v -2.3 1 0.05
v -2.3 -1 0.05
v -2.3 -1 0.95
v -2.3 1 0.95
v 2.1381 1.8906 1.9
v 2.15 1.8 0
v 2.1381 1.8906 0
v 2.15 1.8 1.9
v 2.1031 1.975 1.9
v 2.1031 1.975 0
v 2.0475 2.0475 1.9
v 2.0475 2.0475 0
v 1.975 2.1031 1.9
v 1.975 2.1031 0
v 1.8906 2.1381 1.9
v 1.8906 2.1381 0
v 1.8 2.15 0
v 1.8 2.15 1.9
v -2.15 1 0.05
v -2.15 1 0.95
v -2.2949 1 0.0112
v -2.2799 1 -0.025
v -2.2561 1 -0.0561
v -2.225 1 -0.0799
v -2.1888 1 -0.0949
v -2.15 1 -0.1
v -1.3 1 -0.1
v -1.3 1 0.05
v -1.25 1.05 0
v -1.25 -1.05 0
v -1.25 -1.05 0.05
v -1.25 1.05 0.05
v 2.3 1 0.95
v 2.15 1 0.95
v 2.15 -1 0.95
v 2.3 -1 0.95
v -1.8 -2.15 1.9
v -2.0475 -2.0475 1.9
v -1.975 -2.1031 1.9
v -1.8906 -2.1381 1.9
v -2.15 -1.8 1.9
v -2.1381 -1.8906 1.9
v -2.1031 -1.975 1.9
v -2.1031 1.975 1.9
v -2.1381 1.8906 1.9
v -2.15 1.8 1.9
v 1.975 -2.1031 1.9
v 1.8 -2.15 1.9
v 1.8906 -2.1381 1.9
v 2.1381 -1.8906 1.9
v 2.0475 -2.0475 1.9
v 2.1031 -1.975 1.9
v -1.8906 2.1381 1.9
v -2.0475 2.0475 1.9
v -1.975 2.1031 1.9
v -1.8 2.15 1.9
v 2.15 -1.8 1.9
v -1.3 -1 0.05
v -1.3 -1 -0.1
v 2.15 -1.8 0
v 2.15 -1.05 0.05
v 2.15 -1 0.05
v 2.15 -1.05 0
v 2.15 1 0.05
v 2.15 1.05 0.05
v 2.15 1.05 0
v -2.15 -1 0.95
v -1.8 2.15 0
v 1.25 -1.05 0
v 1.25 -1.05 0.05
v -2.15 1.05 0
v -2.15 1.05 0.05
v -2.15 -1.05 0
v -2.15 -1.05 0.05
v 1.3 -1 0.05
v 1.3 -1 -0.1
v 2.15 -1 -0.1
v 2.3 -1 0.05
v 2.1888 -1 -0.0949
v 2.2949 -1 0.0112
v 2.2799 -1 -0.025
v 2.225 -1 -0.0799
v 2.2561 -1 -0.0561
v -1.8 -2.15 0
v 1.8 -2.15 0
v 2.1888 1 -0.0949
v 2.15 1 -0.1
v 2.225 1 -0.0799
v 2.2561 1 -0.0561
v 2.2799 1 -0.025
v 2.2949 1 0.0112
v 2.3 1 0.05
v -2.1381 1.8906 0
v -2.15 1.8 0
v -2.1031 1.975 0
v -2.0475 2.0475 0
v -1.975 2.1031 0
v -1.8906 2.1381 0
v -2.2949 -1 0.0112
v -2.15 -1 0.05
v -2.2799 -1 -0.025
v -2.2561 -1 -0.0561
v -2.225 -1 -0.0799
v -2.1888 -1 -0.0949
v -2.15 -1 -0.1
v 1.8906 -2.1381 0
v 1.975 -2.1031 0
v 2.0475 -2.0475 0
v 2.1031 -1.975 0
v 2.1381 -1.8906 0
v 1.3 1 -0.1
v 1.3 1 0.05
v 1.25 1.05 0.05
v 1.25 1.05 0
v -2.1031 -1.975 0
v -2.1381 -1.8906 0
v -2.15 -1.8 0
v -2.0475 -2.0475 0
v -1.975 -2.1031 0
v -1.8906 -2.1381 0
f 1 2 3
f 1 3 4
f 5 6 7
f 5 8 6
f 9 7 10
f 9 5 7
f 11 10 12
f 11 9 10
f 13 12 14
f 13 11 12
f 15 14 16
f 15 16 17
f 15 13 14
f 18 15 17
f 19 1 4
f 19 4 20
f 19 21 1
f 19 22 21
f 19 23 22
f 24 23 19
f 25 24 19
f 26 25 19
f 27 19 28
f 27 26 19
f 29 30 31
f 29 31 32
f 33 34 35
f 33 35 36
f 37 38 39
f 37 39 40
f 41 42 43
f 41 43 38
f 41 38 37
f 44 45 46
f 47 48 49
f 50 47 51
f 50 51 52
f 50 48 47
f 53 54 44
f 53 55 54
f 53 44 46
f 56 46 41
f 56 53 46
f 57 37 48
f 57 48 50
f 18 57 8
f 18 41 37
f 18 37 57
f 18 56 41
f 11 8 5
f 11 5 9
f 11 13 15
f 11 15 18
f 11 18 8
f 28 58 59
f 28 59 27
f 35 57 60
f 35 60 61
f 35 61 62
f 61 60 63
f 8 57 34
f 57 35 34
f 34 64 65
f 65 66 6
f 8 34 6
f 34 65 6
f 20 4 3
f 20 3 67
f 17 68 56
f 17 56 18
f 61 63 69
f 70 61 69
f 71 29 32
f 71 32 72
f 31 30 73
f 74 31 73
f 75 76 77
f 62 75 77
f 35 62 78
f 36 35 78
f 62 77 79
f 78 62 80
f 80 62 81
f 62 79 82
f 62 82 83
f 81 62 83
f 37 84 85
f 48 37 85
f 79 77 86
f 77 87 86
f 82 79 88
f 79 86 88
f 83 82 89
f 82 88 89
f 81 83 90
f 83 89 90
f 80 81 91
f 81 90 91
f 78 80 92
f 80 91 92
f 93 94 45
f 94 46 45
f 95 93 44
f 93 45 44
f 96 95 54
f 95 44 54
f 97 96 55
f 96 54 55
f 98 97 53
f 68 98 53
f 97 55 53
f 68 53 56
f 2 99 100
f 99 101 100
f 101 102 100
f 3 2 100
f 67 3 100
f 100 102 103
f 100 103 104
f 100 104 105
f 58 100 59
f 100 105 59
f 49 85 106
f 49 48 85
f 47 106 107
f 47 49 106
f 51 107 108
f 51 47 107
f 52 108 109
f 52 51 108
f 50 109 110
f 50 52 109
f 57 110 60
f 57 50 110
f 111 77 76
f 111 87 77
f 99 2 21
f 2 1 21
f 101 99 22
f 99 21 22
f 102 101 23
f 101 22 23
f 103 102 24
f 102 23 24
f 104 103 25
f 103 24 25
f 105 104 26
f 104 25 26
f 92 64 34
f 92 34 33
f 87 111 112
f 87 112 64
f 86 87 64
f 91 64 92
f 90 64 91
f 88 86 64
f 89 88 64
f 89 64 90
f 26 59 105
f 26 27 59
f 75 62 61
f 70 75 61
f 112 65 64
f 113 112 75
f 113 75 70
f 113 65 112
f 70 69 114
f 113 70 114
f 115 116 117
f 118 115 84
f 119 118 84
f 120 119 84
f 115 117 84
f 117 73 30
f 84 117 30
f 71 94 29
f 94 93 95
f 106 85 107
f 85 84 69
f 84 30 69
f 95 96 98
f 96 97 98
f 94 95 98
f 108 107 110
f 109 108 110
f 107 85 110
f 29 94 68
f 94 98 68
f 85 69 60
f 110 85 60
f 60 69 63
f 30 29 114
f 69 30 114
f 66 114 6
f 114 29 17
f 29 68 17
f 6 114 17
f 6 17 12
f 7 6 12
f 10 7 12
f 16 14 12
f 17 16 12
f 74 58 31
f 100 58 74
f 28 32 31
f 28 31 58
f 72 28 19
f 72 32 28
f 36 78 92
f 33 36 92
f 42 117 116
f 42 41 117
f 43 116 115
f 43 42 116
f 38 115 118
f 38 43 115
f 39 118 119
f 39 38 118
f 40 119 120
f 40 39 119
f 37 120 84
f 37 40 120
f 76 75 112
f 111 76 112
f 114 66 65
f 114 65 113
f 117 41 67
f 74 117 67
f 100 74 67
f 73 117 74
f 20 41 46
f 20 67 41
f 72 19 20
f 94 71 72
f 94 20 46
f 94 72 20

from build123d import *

# Parameters (mm, degrees)
SKETCH1_W           = 4.3
SKETCH1_H           = 4.3
BOSS_EXTRUDE1_DEPTH = 1.9
FILLET1_R           = 0.35
SKETCH2_W           = 0.9
SKETCH2_H           = 2.1
CUT_EXTRUDE1_DEPTH  = 0.05
SKETCH3_W           = 1
SKETCH3_H           = 2
BOSS_EXTRUDE2_DEPTH = 0.15
SKETCH4_W           = 0.15
SKETCH4_H           = 2
BOSS_EXTRUDE3_DEPTH = 0.9
FILLET2_R           = 0.15


with BuildPart() as part:
    # Sketch1 → Boss-Extrude1 (new body)
    with BuildSketch(Plane.XY):
        Rectangle(SKETCH1_W, SKETCH1_H)
    extrude(amount=BOSS_EXTRUDE1_DEPTH)

    # Fillet1
    fillet1_edges = [part.edges().sort_by_distance(p)[0] for p in [
        (2.15, -2.15, 0.95),
        (-2.15, -2.15, 0.95),
        (-2.15, 2.15, 0.95),
        (2.15, 2.15, 0.95),
    ]]
    fillet(fillet1_edges, radius=FILLET1_R)

    # Sketch2 → Cut-Extrude1 (cut)
    with BuildSketch(Plane(origin=(0, 0, 0), x_dir=(-1, 0, 0), z_dir=(0, 0, -1))):
        with Locations((1.7, 0)):
            Rectangle(SKETCH2_W, SKETCH2_H)
        with Locations((-1.7, 0)):
            Rectangle(SKETCH2_W, SKETCH2_H)
    extrude(amount=-CUT_EXTRUDE1_DEPTH, mode=Mode.SUBTRACT)

    # Sketch3 → Boss-Extrude2 (add)
    with BuildSketch(Plane(origin=(0, 0, 0.05), x_dir=(-1, 0, 0), z_dir=(0, 0, -1))):
        with Locations((1.8, 0)):
            Rectangle(SKETCH3_W, SKETCH3_H)
        with Locations((-1.8, 0)):
            Rectangle(SKETCH3_W, SKETCH3_H)
    extrude(amount=BOSS_EXTRUDE2_DEPTH)

    # Sketch4 → Boss-Extrude3 (add)
    with BuildSketch(Plane.XY.offset(0.05)):
        with Locations((-2.225, 0)):
            Rectangle(SKETCH4_W, SKETCH4_H)
        with Locations((2.225, 0)):
            Rectangle(SKETCH4_W, SKETCH4_H)
    extrude(amount=BOSS_EXTRUDE3_DEPTH)

    # Fillet2
    fillet2_edges = [part.edges().sort_by_distance(p)[0] for p in [
        (-2.3, 0, -0.1),
        (2.3, 0, -0.1),
    ]]
    fillet(fillet2_edges, radius=FILLET2_R)


solid = part.part
